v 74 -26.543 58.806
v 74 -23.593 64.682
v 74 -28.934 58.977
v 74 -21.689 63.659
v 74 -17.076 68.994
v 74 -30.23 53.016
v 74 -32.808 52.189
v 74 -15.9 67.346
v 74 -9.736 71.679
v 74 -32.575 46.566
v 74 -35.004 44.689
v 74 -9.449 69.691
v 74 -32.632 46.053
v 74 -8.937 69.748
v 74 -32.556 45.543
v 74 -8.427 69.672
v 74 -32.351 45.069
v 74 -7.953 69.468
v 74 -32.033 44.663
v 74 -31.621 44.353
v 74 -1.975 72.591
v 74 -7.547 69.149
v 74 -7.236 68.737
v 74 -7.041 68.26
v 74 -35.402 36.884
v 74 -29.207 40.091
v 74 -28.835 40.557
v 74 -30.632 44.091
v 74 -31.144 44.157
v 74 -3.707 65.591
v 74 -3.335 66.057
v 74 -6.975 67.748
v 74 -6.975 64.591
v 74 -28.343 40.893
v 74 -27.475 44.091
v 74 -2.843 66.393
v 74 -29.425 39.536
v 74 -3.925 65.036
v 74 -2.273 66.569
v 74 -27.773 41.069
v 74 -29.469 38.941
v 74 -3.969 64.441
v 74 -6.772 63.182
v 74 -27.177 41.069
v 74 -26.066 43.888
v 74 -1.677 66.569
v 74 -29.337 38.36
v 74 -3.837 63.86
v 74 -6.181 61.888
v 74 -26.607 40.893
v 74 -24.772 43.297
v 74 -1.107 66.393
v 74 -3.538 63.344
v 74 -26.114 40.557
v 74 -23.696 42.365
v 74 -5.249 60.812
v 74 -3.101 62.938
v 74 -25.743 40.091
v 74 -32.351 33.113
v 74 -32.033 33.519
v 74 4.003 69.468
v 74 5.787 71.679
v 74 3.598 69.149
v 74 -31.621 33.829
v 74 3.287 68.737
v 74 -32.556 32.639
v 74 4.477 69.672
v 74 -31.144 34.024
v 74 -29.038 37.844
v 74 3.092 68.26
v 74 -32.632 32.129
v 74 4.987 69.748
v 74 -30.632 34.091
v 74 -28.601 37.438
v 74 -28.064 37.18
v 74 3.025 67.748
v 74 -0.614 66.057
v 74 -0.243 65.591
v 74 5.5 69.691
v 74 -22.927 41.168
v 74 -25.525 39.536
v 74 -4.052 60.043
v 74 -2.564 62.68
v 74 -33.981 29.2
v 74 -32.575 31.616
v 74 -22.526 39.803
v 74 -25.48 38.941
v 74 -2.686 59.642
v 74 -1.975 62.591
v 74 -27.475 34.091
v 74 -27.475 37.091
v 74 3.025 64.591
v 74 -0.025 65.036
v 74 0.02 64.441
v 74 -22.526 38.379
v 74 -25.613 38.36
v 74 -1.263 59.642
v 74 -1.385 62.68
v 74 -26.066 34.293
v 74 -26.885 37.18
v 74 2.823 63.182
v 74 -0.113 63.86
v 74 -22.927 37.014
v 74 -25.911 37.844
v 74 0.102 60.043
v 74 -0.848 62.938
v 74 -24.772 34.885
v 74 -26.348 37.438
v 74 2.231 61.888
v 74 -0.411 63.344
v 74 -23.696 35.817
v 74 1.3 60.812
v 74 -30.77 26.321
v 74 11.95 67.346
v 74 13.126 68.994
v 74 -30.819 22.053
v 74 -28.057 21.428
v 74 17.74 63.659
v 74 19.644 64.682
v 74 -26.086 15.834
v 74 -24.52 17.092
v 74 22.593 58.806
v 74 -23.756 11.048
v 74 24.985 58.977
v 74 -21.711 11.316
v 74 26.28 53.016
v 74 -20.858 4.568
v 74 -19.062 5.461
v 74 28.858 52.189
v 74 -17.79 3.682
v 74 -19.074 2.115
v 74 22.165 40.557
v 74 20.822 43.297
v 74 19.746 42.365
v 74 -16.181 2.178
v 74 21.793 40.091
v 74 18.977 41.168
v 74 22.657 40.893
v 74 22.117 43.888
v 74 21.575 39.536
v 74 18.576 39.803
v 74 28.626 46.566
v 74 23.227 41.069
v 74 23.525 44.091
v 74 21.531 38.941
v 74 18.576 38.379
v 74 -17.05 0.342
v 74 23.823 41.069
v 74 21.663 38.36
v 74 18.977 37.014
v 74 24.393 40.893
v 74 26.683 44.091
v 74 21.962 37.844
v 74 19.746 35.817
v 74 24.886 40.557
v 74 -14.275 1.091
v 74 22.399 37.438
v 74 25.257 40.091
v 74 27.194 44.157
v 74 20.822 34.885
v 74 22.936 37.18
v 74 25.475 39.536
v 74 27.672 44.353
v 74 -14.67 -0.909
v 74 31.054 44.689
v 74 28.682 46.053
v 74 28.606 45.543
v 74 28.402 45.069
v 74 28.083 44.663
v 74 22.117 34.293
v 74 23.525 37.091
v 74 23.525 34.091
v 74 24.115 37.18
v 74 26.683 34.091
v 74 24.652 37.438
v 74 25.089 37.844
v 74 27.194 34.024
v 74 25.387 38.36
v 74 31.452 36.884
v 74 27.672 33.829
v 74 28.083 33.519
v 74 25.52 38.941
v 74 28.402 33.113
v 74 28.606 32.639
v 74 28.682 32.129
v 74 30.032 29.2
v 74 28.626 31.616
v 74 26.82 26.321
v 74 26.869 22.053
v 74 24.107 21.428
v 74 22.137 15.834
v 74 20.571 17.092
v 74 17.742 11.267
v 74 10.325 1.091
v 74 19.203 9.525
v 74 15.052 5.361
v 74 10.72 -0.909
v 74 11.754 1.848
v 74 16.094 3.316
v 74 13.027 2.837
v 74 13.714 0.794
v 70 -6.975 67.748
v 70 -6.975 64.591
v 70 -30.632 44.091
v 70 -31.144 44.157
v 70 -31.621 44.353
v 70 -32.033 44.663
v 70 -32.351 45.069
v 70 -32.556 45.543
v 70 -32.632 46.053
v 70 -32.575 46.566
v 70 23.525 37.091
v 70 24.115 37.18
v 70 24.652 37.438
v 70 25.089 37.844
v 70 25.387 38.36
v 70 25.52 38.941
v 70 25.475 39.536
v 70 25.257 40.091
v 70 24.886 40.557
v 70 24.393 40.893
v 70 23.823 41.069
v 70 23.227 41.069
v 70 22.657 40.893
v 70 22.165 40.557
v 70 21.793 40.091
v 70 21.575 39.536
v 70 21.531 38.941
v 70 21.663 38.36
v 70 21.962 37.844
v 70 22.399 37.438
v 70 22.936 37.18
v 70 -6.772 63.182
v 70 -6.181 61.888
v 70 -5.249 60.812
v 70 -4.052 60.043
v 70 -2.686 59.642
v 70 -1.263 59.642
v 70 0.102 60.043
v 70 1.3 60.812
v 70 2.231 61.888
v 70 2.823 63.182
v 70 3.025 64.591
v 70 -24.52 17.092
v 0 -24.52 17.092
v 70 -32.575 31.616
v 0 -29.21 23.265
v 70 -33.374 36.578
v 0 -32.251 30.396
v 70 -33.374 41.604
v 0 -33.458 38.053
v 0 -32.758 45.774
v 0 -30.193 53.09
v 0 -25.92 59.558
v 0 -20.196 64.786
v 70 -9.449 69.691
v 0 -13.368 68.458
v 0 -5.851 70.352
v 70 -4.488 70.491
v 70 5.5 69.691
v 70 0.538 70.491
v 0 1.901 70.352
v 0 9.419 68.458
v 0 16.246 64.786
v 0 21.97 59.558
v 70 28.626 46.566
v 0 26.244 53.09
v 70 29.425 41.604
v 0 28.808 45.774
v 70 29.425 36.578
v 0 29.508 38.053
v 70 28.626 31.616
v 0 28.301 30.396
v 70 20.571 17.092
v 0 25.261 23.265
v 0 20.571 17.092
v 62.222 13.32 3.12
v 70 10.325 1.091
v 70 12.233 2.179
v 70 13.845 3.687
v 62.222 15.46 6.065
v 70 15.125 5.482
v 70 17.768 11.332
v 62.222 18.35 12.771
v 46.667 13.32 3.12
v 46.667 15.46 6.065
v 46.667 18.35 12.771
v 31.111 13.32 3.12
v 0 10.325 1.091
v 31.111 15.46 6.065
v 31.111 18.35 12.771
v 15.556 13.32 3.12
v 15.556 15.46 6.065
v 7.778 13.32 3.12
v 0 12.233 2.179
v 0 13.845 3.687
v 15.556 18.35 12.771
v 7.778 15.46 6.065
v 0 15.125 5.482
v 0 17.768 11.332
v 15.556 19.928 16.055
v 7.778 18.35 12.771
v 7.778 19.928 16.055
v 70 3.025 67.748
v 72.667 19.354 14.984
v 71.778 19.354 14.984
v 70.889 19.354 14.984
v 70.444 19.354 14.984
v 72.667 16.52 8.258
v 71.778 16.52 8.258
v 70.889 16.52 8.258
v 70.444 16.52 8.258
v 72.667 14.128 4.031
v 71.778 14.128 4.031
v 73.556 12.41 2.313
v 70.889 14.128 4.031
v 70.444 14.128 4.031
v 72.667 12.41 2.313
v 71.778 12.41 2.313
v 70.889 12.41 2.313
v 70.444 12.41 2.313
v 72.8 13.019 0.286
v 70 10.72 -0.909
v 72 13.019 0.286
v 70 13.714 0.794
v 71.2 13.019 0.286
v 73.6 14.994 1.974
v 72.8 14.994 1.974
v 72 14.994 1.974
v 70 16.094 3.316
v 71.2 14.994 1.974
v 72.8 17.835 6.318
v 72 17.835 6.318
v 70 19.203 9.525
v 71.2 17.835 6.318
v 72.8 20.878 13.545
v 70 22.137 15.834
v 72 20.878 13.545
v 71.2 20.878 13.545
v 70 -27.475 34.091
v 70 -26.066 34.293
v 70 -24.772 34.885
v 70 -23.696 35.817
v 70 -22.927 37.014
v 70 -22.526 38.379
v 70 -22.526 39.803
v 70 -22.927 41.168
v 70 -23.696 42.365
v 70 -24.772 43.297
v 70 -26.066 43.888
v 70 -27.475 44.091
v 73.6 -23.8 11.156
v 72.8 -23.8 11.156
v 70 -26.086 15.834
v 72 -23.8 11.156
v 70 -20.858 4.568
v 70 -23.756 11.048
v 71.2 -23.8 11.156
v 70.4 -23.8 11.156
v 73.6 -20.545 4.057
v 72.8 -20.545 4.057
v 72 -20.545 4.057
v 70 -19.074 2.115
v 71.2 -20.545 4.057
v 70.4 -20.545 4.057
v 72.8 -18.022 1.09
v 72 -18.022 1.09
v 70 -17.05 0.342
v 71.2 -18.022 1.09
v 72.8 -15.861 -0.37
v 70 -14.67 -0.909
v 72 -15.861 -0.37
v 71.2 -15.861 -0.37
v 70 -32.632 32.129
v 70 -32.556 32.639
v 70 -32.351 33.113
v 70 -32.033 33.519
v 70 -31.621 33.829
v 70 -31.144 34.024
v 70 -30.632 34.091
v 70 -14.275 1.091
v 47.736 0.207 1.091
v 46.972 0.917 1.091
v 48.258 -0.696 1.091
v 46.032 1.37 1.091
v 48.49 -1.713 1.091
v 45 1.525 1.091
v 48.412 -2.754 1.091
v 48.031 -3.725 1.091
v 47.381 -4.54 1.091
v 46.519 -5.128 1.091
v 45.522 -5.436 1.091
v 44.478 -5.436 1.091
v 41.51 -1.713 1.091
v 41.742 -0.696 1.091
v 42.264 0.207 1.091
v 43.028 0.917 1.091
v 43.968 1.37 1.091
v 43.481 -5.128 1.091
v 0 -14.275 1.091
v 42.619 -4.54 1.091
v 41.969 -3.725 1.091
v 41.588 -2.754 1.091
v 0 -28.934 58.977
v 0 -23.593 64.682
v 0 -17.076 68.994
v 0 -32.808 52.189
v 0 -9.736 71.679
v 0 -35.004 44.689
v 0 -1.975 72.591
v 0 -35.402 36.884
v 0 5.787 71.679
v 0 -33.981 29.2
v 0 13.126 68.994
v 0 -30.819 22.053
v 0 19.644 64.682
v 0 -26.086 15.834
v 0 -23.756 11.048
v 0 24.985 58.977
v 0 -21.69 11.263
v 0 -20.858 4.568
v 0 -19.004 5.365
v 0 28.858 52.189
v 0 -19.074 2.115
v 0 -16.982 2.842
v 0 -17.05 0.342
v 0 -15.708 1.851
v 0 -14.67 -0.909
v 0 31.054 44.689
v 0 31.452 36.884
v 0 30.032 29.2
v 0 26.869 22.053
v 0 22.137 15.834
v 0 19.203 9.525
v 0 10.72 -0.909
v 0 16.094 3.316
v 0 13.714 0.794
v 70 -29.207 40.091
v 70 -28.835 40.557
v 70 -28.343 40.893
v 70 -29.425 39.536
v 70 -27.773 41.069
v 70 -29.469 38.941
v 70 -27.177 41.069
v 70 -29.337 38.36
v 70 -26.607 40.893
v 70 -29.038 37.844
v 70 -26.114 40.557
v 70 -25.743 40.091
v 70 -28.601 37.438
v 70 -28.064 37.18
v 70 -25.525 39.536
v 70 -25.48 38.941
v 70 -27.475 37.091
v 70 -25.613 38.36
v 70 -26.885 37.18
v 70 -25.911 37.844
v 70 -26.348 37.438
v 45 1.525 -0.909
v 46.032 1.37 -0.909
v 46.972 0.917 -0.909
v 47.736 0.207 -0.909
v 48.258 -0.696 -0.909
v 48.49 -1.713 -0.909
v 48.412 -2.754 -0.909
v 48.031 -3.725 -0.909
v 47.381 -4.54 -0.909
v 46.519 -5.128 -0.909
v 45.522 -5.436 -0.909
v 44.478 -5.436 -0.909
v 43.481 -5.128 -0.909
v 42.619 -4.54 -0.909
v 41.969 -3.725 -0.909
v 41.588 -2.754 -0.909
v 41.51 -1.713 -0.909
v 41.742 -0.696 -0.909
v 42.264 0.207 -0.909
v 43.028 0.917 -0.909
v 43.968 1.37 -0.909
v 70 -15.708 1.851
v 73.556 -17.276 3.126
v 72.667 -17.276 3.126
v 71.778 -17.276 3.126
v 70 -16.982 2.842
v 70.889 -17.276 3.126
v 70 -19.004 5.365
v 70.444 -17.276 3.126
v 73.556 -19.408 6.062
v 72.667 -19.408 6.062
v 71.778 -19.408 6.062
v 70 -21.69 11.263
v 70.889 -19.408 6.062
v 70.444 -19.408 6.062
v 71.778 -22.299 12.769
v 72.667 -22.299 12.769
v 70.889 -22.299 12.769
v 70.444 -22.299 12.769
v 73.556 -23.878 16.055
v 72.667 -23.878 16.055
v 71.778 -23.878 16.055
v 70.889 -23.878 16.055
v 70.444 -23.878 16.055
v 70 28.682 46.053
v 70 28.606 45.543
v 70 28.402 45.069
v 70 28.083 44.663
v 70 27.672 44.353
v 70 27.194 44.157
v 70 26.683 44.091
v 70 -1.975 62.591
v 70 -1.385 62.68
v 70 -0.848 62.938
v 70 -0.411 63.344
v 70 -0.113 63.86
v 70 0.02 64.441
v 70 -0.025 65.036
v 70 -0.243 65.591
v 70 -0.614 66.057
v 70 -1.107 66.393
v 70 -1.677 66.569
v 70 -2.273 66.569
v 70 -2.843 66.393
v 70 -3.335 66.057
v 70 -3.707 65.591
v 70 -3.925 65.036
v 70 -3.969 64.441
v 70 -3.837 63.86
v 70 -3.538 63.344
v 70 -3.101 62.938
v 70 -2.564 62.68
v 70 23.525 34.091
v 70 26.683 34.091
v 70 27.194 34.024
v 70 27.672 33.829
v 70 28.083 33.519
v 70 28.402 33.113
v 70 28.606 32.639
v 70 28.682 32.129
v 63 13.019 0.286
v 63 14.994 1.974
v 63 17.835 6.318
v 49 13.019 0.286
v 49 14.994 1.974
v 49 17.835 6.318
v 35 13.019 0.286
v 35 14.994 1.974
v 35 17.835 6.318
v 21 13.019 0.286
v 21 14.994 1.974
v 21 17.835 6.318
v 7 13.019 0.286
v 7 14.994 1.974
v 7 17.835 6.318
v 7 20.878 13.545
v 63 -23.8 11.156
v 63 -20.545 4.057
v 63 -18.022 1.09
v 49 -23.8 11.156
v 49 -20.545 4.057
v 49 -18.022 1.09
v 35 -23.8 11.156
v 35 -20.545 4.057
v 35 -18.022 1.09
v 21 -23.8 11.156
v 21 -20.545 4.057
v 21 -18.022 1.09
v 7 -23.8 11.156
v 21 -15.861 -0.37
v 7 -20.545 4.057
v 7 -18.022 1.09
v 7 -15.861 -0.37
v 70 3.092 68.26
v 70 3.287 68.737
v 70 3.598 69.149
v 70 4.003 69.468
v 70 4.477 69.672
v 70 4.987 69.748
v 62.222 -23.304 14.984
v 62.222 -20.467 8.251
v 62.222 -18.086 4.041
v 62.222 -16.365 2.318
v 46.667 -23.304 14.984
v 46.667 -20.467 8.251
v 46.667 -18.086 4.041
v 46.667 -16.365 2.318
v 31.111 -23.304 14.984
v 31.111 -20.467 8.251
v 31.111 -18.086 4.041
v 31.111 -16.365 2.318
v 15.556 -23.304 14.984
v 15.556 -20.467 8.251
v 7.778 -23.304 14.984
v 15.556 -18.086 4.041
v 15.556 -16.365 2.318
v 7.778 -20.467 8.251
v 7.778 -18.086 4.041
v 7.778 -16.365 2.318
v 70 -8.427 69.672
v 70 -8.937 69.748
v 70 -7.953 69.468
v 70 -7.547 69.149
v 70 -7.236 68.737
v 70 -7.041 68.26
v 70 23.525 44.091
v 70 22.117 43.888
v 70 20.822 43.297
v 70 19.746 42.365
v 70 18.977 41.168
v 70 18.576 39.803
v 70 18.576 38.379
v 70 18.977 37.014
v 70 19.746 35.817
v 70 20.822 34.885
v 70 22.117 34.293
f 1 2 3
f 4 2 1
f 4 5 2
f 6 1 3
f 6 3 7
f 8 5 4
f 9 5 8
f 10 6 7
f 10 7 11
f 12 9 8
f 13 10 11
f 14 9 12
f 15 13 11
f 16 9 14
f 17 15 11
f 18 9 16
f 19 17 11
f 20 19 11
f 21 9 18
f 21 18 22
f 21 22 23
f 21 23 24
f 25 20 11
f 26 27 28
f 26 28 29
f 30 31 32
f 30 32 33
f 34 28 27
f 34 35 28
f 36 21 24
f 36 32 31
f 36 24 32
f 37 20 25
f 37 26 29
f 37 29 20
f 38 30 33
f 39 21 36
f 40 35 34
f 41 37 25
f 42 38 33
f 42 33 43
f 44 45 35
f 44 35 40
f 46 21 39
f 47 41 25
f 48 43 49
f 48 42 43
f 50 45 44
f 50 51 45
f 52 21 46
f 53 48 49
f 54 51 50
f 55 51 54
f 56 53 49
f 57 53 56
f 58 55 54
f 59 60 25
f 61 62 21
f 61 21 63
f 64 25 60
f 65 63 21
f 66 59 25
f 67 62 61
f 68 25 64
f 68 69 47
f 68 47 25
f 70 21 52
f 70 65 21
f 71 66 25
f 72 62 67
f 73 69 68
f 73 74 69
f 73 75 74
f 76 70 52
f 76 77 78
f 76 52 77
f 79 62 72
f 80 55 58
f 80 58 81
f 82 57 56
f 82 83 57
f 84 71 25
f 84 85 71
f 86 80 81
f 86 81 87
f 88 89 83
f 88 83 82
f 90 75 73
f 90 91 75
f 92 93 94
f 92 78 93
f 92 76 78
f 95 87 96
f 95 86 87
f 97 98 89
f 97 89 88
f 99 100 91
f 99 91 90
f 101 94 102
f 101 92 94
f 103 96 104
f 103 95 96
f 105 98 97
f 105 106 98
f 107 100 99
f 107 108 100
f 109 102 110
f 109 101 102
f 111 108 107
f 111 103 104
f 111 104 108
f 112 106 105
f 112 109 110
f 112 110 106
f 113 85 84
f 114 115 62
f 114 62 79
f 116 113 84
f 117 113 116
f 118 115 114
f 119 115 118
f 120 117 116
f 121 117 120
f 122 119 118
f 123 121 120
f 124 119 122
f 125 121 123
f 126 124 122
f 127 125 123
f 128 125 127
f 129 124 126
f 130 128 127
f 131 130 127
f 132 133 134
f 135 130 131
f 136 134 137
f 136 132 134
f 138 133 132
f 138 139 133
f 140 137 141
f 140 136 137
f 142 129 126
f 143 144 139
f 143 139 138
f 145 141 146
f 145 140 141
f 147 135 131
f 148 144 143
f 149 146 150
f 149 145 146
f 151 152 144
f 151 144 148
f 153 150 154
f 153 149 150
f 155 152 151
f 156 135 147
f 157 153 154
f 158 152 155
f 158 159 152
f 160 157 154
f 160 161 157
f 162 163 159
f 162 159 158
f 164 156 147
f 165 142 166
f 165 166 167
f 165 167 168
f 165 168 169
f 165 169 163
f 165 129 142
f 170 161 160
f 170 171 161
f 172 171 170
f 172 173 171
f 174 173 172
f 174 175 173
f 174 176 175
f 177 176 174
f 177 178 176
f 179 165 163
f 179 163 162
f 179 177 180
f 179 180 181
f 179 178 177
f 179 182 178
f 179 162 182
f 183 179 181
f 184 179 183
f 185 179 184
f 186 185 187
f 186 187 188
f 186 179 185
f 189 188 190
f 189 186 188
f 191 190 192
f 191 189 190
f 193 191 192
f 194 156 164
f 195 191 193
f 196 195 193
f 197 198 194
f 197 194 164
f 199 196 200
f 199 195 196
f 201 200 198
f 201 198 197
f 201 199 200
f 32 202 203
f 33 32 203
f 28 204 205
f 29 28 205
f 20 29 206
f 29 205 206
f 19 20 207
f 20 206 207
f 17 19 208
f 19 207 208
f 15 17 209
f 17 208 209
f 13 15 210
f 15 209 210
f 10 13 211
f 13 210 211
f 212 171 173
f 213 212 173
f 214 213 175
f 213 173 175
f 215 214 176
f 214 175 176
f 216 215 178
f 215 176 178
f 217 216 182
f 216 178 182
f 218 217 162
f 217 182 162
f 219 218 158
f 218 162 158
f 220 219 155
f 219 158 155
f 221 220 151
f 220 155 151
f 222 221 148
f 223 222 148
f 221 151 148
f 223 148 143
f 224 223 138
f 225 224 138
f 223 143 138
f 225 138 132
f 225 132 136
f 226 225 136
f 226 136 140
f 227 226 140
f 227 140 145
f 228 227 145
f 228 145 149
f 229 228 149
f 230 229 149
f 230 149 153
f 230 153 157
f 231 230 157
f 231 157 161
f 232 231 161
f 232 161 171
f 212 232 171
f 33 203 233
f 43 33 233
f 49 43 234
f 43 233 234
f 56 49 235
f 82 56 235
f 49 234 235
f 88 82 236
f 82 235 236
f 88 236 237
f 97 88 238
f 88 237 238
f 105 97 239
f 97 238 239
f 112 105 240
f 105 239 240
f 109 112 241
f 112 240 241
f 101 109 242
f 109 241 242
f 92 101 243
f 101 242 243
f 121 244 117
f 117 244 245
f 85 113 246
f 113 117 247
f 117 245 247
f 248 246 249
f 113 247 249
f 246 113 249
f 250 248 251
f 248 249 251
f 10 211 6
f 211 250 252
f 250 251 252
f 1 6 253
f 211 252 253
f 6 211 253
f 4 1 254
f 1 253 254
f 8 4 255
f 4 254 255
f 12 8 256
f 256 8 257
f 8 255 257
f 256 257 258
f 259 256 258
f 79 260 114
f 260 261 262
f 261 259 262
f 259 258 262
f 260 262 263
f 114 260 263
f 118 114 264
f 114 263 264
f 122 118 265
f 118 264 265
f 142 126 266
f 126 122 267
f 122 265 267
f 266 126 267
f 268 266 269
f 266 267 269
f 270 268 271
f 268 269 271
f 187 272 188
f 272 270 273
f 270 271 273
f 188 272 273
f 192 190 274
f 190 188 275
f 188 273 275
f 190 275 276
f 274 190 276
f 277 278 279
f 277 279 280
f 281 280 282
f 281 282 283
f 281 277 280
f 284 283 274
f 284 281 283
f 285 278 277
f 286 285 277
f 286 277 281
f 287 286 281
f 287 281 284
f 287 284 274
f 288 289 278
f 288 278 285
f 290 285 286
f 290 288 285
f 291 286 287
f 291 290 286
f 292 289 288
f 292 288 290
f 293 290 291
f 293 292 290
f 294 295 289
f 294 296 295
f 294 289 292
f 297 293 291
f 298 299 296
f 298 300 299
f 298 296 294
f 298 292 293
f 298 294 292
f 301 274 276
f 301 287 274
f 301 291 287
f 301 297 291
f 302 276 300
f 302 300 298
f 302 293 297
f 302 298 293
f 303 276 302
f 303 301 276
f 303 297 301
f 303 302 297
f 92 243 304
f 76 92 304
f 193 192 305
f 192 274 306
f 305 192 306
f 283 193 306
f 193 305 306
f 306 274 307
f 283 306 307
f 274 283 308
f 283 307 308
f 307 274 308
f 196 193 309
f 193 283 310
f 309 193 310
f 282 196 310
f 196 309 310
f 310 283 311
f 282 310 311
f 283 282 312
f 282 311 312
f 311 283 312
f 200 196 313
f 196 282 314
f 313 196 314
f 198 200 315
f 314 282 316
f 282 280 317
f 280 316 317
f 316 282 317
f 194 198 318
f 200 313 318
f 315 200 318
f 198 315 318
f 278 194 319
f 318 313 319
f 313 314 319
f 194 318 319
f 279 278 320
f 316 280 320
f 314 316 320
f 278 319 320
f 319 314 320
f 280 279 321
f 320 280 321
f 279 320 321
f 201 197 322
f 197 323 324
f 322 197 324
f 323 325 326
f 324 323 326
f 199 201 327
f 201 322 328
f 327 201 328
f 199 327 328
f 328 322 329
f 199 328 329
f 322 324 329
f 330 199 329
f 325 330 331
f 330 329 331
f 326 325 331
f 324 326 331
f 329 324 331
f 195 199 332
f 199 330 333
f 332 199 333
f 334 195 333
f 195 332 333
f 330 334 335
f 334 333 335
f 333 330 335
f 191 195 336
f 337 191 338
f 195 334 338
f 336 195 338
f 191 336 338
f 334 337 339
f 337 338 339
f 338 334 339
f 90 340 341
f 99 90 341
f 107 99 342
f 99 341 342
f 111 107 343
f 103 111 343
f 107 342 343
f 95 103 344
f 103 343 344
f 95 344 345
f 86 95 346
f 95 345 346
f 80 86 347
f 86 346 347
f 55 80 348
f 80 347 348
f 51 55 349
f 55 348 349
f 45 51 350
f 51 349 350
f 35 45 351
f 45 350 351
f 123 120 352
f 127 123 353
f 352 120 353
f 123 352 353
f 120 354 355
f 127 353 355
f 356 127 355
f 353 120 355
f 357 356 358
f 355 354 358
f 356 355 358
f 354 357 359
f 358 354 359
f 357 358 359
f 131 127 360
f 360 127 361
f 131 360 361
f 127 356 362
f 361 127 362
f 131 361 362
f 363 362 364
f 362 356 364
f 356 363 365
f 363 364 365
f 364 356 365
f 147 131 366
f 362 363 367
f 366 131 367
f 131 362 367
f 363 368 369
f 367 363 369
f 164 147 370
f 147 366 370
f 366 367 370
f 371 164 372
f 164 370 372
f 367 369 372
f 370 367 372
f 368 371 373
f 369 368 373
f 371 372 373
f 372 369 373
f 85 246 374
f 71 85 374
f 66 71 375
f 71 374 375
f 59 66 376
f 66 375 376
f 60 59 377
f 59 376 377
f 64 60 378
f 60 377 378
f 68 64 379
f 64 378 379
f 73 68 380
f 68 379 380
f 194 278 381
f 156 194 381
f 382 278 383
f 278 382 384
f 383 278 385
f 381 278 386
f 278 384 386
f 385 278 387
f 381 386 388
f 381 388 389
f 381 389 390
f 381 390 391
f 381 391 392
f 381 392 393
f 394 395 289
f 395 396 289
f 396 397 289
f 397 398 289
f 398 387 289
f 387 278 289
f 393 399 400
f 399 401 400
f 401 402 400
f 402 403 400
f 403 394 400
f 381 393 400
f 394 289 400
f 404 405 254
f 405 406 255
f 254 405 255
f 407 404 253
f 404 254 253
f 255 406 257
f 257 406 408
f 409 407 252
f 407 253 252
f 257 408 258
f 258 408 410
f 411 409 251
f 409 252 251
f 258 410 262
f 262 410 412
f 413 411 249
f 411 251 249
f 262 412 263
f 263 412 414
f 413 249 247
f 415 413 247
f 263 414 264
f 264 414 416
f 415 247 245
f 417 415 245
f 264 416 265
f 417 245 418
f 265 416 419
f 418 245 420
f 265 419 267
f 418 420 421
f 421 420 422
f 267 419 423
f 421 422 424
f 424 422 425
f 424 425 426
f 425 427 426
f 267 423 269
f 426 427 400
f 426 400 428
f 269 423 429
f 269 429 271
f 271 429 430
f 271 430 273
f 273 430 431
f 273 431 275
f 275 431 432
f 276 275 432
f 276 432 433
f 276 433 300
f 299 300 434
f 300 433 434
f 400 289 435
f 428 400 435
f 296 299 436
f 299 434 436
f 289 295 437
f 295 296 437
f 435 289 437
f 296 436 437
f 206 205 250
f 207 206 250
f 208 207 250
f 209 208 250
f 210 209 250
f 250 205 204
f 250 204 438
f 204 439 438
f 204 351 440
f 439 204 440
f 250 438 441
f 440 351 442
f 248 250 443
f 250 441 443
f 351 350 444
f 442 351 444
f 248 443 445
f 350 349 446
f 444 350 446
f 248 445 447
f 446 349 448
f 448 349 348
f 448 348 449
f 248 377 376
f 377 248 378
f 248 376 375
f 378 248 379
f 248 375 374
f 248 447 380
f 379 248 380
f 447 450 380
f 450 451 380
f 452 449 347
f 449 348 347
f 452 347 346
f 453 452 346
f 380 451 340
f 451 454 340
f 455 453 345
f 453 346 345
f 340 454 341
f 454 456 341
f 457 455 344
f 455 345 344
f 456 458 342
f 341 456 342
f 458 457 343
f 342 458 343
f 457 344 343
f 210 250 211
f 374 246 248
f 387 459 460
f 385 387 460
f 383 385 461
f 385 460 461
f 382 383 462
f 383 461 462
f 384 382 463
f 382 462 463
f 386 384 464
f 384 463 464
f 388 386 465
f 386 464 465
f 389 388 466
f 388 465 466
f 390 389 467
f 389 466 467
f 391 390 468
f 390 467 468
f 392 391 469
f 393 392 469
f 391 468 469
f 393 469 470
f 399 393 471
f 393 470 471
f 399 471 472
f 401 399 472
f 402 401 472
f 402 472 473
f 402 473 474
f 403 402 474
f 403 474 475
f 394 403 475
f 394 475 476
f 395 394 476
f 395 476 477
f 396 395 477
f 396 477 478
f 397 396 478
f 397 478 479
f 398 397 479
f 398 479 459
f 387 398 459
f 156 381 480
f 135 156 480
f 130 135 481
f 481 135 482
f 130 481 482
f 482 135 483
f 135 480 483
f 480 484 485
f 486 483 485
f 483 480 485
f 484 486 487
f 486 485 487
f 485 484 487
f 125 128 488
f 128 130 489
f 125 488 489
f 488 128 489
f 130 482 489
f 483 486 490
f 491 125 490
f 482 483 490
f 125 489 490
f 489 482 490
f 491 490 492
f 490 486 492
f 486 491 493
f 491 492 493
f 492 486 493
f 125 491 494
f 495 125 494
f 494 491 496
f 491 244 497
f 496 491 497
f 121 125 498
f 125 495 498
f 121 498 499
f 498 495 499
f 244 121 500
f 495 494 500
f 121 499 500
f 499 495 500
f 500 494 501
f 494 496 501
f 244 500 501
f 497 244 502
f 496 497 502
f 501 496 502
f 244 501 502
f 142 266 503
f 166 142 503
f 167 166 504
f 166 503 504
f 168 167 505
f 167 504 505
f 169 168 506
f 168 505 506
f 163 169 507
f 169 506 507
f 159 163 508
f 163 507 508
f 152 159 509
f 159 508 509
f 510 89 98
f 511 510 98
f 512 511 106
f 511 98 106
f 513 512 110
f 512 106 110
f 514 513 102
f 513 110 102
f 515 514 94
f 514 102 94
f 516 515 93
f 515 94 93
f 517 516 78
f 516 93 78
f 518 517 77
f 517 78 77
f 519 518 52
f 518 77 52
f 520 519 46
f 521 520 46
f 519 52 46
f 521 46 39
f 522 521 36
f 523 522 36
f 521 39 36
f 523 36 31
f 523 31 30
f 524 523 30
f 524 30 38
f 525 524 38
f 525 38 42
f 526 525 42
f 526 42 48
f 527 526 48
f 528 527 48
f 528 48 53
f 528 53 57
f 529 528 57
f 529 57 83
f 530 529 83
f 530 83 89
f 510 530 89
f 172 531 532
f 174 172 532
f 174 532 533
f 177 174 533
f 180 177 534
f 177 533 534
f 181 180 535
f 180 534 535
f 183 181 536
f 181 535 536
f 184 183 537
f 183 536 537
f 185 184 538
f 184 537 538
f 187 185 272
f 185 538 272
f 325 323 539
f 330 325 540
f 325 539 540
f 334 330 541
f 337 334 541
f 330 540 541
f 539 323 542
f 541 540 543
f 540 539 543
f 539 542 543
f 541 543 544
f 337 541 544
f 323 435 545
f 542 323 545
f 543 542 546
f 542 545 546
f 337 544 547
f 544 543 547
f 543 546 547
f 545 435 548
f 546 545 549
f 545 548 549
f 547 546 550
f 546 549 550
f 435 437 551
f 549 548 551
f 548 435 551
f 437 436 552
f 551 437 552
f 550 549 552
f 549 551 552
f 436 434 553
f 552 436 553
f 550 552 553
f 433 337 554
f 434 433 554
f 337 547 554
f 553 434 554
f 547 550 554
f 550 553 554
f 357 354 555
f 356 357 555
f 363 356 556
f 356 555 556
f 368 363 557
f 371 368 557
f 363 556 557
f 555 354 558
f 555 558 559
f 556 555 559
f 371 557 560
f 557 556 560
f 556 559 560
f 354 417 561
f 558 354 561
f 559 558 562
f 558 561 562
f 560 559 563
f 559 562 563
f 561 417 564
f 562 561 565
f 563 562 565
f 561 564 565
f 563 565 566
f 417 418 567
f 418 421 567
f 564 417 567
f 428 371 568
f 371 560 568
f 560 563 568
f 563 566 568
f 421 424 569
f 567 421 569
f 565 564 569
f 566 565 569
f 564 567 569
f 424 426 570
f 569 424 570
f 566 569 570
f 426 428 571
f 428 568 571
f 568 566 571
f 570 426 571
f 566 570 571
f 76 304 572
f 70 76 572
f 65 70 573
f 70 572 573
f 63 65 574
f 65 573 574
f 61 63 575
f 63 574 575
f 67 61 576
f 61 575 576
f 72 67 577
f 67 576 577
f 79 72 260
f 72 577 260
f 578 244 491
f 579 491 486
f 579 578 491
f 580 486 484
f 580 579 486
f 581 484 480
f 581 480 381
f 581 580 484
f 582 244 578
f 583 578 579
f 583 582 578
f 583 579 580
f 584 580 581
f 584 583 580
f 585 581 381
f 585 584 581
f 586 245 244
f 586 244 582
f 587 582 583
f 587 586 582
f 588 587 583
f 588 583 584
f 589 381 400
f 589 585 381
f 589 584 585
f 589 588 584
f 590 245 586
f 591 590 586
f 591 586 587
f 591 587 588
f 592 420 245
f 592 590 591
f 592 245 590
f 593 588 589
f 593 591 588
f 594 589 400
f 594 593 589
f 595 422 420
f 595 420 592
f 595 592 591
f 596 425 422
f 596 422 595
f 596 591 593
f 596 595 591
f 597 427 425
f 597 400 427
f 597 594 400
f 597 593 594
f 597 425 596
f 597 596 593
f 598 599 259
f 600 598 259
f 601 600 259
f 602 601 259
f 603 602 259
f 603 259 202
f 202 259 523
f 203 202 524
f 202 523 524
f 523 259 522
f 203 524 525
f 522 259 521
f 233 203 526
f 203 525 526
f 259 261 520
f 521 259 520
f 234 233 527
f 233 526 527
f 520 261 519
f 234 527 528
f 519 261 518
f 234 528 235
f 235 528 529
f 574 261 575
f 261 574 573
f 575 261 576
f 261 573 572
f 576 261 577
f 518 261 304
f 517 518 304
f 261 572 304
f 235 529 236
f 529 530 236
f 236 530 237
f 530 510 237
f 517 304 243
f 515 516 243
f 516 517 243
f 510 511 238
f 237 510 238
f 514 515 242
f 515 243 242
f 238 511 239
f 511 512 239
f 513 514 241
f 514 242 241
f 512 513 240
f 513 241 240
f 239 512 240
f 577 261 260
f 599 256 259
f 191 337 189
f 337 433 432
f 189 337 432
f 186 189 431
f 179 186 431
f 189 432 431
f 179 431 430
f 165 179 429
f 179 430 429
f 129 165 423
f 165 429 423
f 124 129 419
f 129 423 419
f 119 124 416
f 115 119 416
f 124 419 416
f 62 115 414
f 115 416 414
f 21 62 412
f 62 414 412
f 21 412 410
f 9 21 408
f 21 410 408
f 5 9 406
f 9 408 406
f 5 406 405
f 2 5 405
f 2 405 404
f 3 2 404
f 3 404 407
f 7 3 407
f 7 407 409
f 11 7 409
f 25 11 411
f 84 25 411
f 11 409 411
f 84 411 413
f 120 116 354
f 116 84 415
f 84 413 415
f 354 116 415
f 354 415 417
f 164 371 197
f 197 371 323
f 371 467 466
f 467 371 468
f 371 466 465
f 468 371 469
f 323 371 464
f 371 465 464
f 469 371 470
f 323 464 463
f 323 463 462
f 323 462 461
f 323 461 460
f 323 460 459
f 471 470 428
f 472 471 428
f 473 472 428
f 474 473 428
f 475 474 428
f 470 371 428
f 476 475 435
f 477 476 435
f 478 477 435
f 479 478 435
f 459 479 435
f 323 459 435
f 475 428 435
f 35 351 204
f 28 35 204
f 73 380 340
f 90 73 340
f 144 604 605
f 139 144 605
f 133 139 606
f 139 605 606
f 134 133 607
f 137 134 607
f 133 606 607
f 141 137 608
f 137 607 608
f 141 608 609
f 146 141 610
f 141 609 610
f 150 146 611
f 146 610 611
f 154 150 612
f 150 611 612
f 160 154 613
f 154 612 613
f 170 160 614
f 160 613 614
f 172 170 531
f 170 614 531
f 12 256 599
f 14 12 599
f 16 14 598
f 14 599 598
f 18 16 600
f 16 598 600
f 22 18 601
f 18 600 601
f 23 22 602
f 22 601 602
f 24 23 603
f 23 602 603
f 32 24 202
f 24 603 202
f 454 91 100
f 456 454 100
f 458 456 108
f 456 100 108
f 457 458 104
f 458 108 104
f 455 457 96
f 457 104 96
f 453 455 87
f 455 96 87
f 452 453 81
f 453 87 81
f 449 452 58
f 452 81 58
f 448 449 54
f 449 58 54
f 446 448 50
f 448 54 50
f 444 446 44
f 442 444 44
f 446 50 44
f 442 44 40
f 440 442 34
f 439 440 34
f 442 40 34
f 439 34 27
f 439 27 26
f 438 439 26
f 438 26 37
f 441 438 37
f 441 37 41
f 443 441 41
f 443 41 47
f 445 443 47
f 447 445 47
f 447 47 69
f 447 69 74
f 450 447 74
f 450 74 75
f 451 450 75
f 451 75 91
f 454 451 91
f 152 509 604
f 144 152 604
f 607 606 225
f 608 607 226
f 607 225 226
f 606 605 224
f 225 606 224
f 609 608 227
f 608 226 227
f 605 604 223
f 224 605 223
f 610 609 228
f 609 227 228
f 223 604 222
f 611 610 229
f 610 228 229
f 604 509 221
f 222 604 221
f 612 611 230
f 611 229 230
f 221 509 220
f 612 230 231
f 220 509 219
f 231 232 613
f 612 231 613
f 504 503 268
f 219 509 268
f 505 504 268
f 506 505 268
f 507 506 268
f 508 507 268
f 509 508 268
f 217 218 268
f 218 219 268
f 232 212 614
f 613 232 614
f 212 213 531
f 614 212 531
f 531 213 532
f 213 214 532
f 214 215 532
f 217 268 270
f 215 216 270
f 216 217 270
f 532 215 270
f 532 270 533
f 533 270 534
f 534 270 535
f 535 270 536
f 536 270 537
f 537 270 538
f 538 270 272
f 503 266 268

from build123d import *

# Parameters (mm, degrees)
EXTRUDE_THIN3_DEPTH = 70
CUT_EXTRUDE2_REACH  = 109.521
SKETCH14_R          = 3.5
BOSS_EXTRUDE2_DEPTH = 4
CUT_EXTRUDE3_REACH  = 111.562
SKETCH16_R          = 2


# Read off the part's stored shape, not the designer's step: Extrude-Thin3
with BuildPart() as part:
    # Extrude-Thin3 outline → Extrude-Thin3 (new body)
    with BuildSketch(Plane(origin=(0, 0, 0), x_dir=(0, 0, -1), z_dir=(1, 0, 0))):
        with BuildLine():
            Line((0.909061836, -14.669862969), (0.909061836, 10.720277827))
            add(Edge.make_bspline(
                [(0.909061836, 10.720277827), (0.826807355, 10.923087932), (0.744181279, 11.125656518), (0.56557007, 11.522110942), (0.471224829, 11.717062632), (0.172894413, 12.291976881), (-0.046398469, 12.661990163), (-0.526461943, 13.3750582), (-0.787239132, 13.718108666), (-1.350452209, 14.377133437), (-1.655192648, 14.695127232), (-2.611741239, 15.59168673), (-3.302902398, 16.112815322), (-4.761466671, 17.045865484), (-5.53142089, 17.458814961), (-7.892254177, 18.588450633), (-9.528253043, 19.196215177), (-11.954588006, 20.171146985), (-12.758502474, 20.50618552), (-14.330984575, 21.249380319), (-15.099811003, 21.657001246), (-15.833853889, 22.136574686)],
                knots=[0, 0, 0, 0, 0.03125, 0.03125, 0.0625, 0.0625, 0.125, 0.125, 0.1875, 0.1875, 0.25, 0.25, 0.375, 0.375, 0.5, 0.5, 0.75, 0.75, 0.875, 0.875, 1, 1, 1, 1], degree=3))
            ThreePointArc((-15.833853889, 22.136574686), (-72.590938164, -1.974792572), (-15.833853889, -26.086159829))
            add(Edge.make_bspline(
                [(-15.833853889, -26.086159829), (-15.100496012, -25.607033927), (-14.33307243, -25.200103061), (-12.764214382, -24.458320177), (-11.962517255, -24.124024817), (-9.543078024, -23.151545958), (-7.91051316, -22.544836021), (-5.561104569, -21.423547872), (-4.79446395, -21.014741551), (-3.318943636, -20.074420204), (-2.625372945, -19.551564831), (-1.676371211, -18.665750443), (-1.375044416, -18.353480395), (-0.805721249, -17.691186874), (-0.538297709, -17.341162489), (-0.051350693, -16.619956398), (0.170067695, -16.246729246), (0.470274569, -15.668617459), (0.565026353, -15.472870038), (0.74411778, -15.075415403), (0.826777522, -14.872746631), (0.909061836, -14.669862969)],
                knots=[0, 0, 0, 0, 0.125, 0.125, 0.25, 0.25, 0.5, 0.5, 0.625, 0.625, 0.75, 0.75, 0.8125, 0.8125, 0.875, 0.875, 0.9375, 0.9375, 0.96875, 0.96875, 1, 1, 1, 1], degree=3))
        make_face()
        with BuildLine():
            add(Edge.make_bspline(
                [(-1.090938164, 10.325407182), (-1.412619551, 11.077844383), (-1.818903118, 11.773335552), (-2.560343937, 12.727712215), (-2.82988586, 13.031635411), (-3.409343177, 13.608690849), (-3.714063514, 13.876920015), (-4.665569169, 14.631043316), (-5.350730703, 15.067277009), (-6.778514977, 15.852248881), (-7.51323501, 16.197307873), (-9.746388539, 17.166464268), (-11.274315356, 17.725239814), (-13.519666401, 18.662442973), (-14.260301039, 18.990774084), (-15.345466848, 19.53582833), (-15.702879517, 19.72629627), (-16.406506385, 20.130056979), (-16.751779952, 20.345266955), (-17.092044079, 20.57068722)],
                knots=[0, 0, 0, 0, 0.125, 0.125, 0.1875, 0.1875, 0.25, 0.25, 0.375, 0.375, 0.5, 0.5, 0.75, 0.75, 0.875, 0.875, 0.9375, 0.9375, 1, 1, 1, 1], degree=3))
            Line((-1.090938164, 10.325407182), (-1.090938164, -14.274992324))
            add(Edge.make_bspline(
                [(-17.092044079, -24.520272363), (-16.75212318, -24.295079481), (-16.407083703, -24.079991441), (-15.70360059, -23.676277181), (-15.346119507, -23.485750739), (-14.260396239, -22.940388161), (-13.518917037, -22.611683886), (-11.270338851, -21.673228184), (-9.742212218, -21.11454584), (-7.505722666, -20.143477325), (-6.769494687, -19.796998712), (-5.355263551, -19.019229951), (-4.67562832, -18.587497232), (-3.723670077, -17.834658118), (-3.416539548, -17.564934821), (-2.835052735, -16.986863036), (-2.565424759, -16.68332576), (-1.821919986, -15.727813675), (-1.413961463, -15.03056836), (-1.090938164, -14.274992324)],
                knots=[0, 0, 0, 0, 0.0625, 0.0625, 0.125, 0.125, 0.25, 0.25, 0.5, 0.5, 0.625, 0.625, 0.75, 0.75, 0.8125, 0.8125, 0.875, 0.875, 1, 1, 1, 1], degree=3))
            ThreePointArc((-17.092044079, -24.520272363), (-70.590938164, -1.974792572), (-17.092044079, 20.57068722))
        make_face(mode=Mode.SUBTRACT)
    extrude(amount=EXTRUDE_THIN3_DEPTH)

    # Sketch14 → Cut-Extrude2 (cut, up to next)
    with BuildSketch(Plane(origin=(0, 0, -0.909061836), x_dir=(-1, 0, 0), z_dir=(0, 0, -1)), mode=Mode.PRIVATE) as cut_extrude2_sk1:
        with Locations(Location((-45, -1.974792571, 0), (0, 0, 90))):
            Circle(SKETCH14_R)
    cut_extrude2_tool1 = extrude(cut_extrude2_sk1.sketch, amount=-CUT_EXTRUDE2_REACH, mode=Mode.PRIVATE) & part.part
    add(cut_extrude2_tool1.solids().sort_by_distance((45, -1.974793, -0.909062))[0], mode=Mode.SUBTRACT)

    # Sketch15 → Boss-Extrude2 (add)
    # profile 1 of 4: a face of its own
    with BuildSketch(Plane(origin=(70, 0, 0), x_dir=(0, 0, -1), z_dir=(1, 0, 0))):
        with BuildLine():
            Line((0.909061836, -14.669862969), (0.909061836, 10.720277827))
            add(Edge.make_bspline(
                [(0.909061836, 10.720277827), (0.826807355, 10.923087932), (0.744181279, 11.125656518), (0.56557007, 11.522110942), (0.471224829, 11.717062632), (0.172894413, 12.291976881), (-0.046398469, 12.661990163), (-0.526461943, 13.3750582), (-0.787239132, 13.718108666), (-1.350452209, 14.377133437), (-1.655192648, 14.695127232), (-2.611741239, 15.59168673), (-3.302902398, 16.112815322), (-4.761466671, 17.045865484), (-5.53142089, 17.458814961), (-7.892254177, 18.588450633), (-9.528253043, 19.196215177), (-11.954588006, 20.171146985), (-12.758502474, 20.50618552), (-14.330984575, 21.249380319), (-15.099811003, 21.657001246), (-15.833853889, 22.136574686)],
                knots=[0, 0, 0, 0, 0.03125, 0.03125, 0.0625, 0.0625, 0.125, 0.125, 0.1875, 0.1875, 0.25, 0.25, 0.375, 0.375, 0.5, 0.5, 0.75, 0.75, 0.875, 0.875, 1, 1, 1, 1], degree=3))
            ThreePointArc((-15.833853889, 22.136574686), (-72.590938164, -1.974792571), (-15.833853889, -26.086159829))
            add(Edge.make_bspline(
                [(-15.833853889, -26.086159829), (-15.100496012, -25.607033927), (-14.33307243, -25.200103061), (-12.764214382, -24.458320177), (-11.962517255, -24.124024817), (-9.543078024, -23.151545958), (-7.91051316, -22.544836021), (-5.561104569, -21.423547872), (-4.79446395, -21.014741551), (-3.318943636, -20.074420204), (-2.625372945, -19.551564831), (-1.676371211, -18.665750443), (-1.375044416, -18.353480395), (-0.805721249, -17.691186874), (-0.538297709, -17.341162489), (-0.051350693, -16.619956398), (0.170067695, -16.246729246), (0.470274569, -15.668617459), (0.565026353, -15.472870038), (0.74411778, -15.075415403), (0.826777522, -14.872746631), (0.909061836, -14.669862969)],
                knots=[0, 0, 0, 0, 0.125, 0.125, 0.25, 0.25, 0.5, 0.5, 0.625, 0.625, 0.75, 0.75, 0.8125, 0.8125, 0.875, 0.875, 0.9375, 0.9375, 0.96875, 0.96875, 1, 1, 1, 1], degree=3))
        make_face()
        with BuildLine():
            ThreePointArc((-17.092044079, -24.520272363), (-70.590938164, -1.974792571), (-17.092044079, 20.57068722))
            add(Edge.make_bspline(
                [(-17.092044079, 20.57068722), (-16.751779952, 20.345266955), (-16.406506385, 20.130056979), (-15.702879517, 19.72629627), (-15.345466848, 19.53582833), (-14.260301039, 18.990774084), (-13.519666401, 18.662442973), (-11.274315356, 17.725239814), (-9.746388539, 17.166464268), (-7.51323501, 16.197307873), (-6.778514977, 15.852248881), (-5.350730703, 15.067277009), (-4.665569169, 14.631043316), (-3.714063514, 13.876920015), (-3.409343177, 13.608690849), (-2.82988586, 13.031635411), (-2.560343937, 12.727712215), (-1.818903118, 11.773335552), (-1.412619551, 11.077844383), (-1.090938164, 10.325407182)],
                knots=[0, 0, 0, 0, 0.0625, 0.0625, 0.125, 0.125, 0.25, 0.25, 0.5, 0.5, 0.625, 0.625, 0.75, 0.75, 0.8125, 0.8125, 0.875, 0.875, 1, 1, 1, 1], degree=3))
            Line((-1.090938164, 10.325407182), (-1.090938164, -14.274992324))
            add(Edge.make_bspline(
                [(-1.090938164, -14.274992324), (-1.413961463, -15.03056836), (-1.821919986, -15.727813675), (-2.565424759, -16.68332576), (-2.835052735, -16.986863036), (-3.416539548, -17.564934821), (-3.723670077, -17.834658118), (-4.67562832, -18.587497232), (-5.355263551, -19.019229951), (-6.769494687, -19.796998712), (-7.505722666, -20.143477325), (-9.742212218, -21.11454584), (-11.270338851, -21.673228184), (-13.518917037, -22.611683886), (-14.260396239, -22.940388161), (-15.346119507, -23.485750739), (-15.70360059, -23.676277181), (-16.407083703, -24.079991441), (-16.75212318, -24.295079481), (-17.092044079, -24.520272363)],
                knots=[0, 0, 0, 0, 0.125, 0.125, 0.1875, 0.1875, 0.25, 0.25, 0.375, 0.375, 0.5, 0.5, 0.75, 0.75, 0.875, 0.875, 0.9375, 0.9375, 1, 1, 1, 1], degree=3))
        make_face(mode=Mode.SUBTRACT)
    # profile 2 of 4: a face of its own
    with BuildSketch(Plane(origin=(70, 0, 0), x_dir=(0, 0, -1), z_dir=(1, 0, 0))):
        with BuildLine():
            ThreePointArc((-67.748397926, 3.025207429), (-69.321476522, 3.790126974), (-69.691276554, 5.4997837))
            ThreePointArc((-69.691276554, 5.4997837), (-70.590938164, -1.974792571), (-69.691276554, -9.449368842))
            ThreePointArc((-69.691276554, -9.449368842), (-69.321476522, -7.739712117), (-67.748397926, -6.974792571))
            Line((-67.748397926, -6.974792571), (-64.590938164, -6.974792571))
            ThreePointArc((-64.590938164, -6.974792571), (-59.590938164, -1.974792571), (-64.590938164, 3.025207429))
            Line((-64.590938164, 3.025207429), (-67.748397926, 3.025207429))
        make_face()
    # profile 3 of 4: a face of its own
    with BuildSketch(Plane(origin=(70, 0, 0), x_dir=(0, 0, -1), z_dir=(1, 0, 0))):
        with BuildLine():
            Line((-34.090938164, 23.525207429), (-34.090938164, 26.682667191))
            ThreePointArc((-34.090938164, 26.682667191), (-33.326018618, 28.255745787), (-31.616361893, 28.625545818))
            ThreePointArc((-31.616361893, 28.625545818), (-39.090938164, 29.525207429), (-46.565514435, 28.625545818))
            ThreePointArc((-46.565514435, 28.625545818), (-44.85585771, 28.255745787), (-44.090938164, 26.682667191))
            Line((-44.090938164, 26.682667191), (-44.090938164, 23.525207429))
            ThreePointArc((-44.090938164, 23.525207429), (-39.090938164, 18.525207429), (-34.090938164, 23.525207429))
        make_face()
    # profile 4 of 4: a face of its own
    with BuildSketch(Plane(origin=(70, 0, 0), x_dir=(0, 0, -1), z_dir=(1, 0, 0))):
        with BuildLine():
            ThreePointArc((-44.090938164, -30.632252333), (-44.85585771, -32.20533093), (-46.565514435, -32.575130961))
            ThreePointArc((-46.565514435, -32.575130961), (-39.090938164, -33.474792571), (-31.616361893, -32.575130961))
            ThreePointArc((-31.616361893, -32.575130961), (-33.326018618, -32.20533093), (-34.090938164, -30.632252333))
            Line((-34.090938164, -30.632252333), (-34.090938164, -27.474792571))
            ThreePointArc((-34.090938164, -27.474792571), (-39.090938164, -22.474792571), (-44.090938164, -27.474792571))
            Line((-44.090938164, -27.474792571), (-44.090938164, -30.632252333))
        make_face()
    extrude(amount=BOSS_EXTRUDE2_DEPTH)

    # Sketch16 → Cut-Extrude3 (cut, up to next)
    with BuildSketch(Plane(origin=(74, 0, 0), x_dir=(0, 0, -1), z_dir=(1, 0, 0)), mode=Mode.PRIVATE) as cut_extrude3_sk1:
        with Locations((-64.590938164, -1.974792571)):
            Circle(SKETCH16_R)
    cut_extrude3_tool1 = extrude(cut_extrude3_sk1.sketch, amount=-CUT_EXTRUDE3_REACH, mode=Mode.PRIVATE) & part.part
    # Sketch16 → Cut-Extrude3 (cut, up to next)
    with BuildSketch(Plane(origin=(74, 0, 0), x_dir=(0, 0, -1), z_dir=(1, 0, 0)), mode=Mode.PRIVATE) as cut_extrude3_sk2:
        with Locations((-39.090938164, 23.525207429)):
            Circle(SKETCH16_R)
    cut_extrude3_tool2 = extrude(cut_extrude3_sk2.sketch, amount=-CUT_EXTRUDE3_REACH, mode=Mode.PRIVATE) & part.part
    # Sketch16 → Cut-Extrude3 (cut, up to next)
    with BuildSketch(Plane(origin=(74, 0, 0), x_dir=(0, 0, -1), z_dir=(1, 0, 0)), mode=Mode.PRIVATE) as cut_extrude3_sk3:
        with Locations((-39.090938164, -27.474792571)):
            Circle(SKETCH16_R)
    cut_extrude3_tool3 = extrude(cut_extrude3_sk3.sketch, amount=-CUT_EXTRUDE3_REACH, mode=Mode.PRIVATE) & part.part
    add(cut_extrude3_tool1.solids().sort_by_distance((74, -1.974793, 64.590938))[0], mode=Mode.SUBTRACT)
    add(cut_extrude3_tool2.solids().sort_by_distance((74, 23.525207, 39.090938))[0], mode=Mode.SUBTRACT)
    add(cut_extrude3_tool3.solids().sort_by_distance((74, -27.474793, 39.090938))[0], mode=Mode.SUBTRACT)


solid = part.part
